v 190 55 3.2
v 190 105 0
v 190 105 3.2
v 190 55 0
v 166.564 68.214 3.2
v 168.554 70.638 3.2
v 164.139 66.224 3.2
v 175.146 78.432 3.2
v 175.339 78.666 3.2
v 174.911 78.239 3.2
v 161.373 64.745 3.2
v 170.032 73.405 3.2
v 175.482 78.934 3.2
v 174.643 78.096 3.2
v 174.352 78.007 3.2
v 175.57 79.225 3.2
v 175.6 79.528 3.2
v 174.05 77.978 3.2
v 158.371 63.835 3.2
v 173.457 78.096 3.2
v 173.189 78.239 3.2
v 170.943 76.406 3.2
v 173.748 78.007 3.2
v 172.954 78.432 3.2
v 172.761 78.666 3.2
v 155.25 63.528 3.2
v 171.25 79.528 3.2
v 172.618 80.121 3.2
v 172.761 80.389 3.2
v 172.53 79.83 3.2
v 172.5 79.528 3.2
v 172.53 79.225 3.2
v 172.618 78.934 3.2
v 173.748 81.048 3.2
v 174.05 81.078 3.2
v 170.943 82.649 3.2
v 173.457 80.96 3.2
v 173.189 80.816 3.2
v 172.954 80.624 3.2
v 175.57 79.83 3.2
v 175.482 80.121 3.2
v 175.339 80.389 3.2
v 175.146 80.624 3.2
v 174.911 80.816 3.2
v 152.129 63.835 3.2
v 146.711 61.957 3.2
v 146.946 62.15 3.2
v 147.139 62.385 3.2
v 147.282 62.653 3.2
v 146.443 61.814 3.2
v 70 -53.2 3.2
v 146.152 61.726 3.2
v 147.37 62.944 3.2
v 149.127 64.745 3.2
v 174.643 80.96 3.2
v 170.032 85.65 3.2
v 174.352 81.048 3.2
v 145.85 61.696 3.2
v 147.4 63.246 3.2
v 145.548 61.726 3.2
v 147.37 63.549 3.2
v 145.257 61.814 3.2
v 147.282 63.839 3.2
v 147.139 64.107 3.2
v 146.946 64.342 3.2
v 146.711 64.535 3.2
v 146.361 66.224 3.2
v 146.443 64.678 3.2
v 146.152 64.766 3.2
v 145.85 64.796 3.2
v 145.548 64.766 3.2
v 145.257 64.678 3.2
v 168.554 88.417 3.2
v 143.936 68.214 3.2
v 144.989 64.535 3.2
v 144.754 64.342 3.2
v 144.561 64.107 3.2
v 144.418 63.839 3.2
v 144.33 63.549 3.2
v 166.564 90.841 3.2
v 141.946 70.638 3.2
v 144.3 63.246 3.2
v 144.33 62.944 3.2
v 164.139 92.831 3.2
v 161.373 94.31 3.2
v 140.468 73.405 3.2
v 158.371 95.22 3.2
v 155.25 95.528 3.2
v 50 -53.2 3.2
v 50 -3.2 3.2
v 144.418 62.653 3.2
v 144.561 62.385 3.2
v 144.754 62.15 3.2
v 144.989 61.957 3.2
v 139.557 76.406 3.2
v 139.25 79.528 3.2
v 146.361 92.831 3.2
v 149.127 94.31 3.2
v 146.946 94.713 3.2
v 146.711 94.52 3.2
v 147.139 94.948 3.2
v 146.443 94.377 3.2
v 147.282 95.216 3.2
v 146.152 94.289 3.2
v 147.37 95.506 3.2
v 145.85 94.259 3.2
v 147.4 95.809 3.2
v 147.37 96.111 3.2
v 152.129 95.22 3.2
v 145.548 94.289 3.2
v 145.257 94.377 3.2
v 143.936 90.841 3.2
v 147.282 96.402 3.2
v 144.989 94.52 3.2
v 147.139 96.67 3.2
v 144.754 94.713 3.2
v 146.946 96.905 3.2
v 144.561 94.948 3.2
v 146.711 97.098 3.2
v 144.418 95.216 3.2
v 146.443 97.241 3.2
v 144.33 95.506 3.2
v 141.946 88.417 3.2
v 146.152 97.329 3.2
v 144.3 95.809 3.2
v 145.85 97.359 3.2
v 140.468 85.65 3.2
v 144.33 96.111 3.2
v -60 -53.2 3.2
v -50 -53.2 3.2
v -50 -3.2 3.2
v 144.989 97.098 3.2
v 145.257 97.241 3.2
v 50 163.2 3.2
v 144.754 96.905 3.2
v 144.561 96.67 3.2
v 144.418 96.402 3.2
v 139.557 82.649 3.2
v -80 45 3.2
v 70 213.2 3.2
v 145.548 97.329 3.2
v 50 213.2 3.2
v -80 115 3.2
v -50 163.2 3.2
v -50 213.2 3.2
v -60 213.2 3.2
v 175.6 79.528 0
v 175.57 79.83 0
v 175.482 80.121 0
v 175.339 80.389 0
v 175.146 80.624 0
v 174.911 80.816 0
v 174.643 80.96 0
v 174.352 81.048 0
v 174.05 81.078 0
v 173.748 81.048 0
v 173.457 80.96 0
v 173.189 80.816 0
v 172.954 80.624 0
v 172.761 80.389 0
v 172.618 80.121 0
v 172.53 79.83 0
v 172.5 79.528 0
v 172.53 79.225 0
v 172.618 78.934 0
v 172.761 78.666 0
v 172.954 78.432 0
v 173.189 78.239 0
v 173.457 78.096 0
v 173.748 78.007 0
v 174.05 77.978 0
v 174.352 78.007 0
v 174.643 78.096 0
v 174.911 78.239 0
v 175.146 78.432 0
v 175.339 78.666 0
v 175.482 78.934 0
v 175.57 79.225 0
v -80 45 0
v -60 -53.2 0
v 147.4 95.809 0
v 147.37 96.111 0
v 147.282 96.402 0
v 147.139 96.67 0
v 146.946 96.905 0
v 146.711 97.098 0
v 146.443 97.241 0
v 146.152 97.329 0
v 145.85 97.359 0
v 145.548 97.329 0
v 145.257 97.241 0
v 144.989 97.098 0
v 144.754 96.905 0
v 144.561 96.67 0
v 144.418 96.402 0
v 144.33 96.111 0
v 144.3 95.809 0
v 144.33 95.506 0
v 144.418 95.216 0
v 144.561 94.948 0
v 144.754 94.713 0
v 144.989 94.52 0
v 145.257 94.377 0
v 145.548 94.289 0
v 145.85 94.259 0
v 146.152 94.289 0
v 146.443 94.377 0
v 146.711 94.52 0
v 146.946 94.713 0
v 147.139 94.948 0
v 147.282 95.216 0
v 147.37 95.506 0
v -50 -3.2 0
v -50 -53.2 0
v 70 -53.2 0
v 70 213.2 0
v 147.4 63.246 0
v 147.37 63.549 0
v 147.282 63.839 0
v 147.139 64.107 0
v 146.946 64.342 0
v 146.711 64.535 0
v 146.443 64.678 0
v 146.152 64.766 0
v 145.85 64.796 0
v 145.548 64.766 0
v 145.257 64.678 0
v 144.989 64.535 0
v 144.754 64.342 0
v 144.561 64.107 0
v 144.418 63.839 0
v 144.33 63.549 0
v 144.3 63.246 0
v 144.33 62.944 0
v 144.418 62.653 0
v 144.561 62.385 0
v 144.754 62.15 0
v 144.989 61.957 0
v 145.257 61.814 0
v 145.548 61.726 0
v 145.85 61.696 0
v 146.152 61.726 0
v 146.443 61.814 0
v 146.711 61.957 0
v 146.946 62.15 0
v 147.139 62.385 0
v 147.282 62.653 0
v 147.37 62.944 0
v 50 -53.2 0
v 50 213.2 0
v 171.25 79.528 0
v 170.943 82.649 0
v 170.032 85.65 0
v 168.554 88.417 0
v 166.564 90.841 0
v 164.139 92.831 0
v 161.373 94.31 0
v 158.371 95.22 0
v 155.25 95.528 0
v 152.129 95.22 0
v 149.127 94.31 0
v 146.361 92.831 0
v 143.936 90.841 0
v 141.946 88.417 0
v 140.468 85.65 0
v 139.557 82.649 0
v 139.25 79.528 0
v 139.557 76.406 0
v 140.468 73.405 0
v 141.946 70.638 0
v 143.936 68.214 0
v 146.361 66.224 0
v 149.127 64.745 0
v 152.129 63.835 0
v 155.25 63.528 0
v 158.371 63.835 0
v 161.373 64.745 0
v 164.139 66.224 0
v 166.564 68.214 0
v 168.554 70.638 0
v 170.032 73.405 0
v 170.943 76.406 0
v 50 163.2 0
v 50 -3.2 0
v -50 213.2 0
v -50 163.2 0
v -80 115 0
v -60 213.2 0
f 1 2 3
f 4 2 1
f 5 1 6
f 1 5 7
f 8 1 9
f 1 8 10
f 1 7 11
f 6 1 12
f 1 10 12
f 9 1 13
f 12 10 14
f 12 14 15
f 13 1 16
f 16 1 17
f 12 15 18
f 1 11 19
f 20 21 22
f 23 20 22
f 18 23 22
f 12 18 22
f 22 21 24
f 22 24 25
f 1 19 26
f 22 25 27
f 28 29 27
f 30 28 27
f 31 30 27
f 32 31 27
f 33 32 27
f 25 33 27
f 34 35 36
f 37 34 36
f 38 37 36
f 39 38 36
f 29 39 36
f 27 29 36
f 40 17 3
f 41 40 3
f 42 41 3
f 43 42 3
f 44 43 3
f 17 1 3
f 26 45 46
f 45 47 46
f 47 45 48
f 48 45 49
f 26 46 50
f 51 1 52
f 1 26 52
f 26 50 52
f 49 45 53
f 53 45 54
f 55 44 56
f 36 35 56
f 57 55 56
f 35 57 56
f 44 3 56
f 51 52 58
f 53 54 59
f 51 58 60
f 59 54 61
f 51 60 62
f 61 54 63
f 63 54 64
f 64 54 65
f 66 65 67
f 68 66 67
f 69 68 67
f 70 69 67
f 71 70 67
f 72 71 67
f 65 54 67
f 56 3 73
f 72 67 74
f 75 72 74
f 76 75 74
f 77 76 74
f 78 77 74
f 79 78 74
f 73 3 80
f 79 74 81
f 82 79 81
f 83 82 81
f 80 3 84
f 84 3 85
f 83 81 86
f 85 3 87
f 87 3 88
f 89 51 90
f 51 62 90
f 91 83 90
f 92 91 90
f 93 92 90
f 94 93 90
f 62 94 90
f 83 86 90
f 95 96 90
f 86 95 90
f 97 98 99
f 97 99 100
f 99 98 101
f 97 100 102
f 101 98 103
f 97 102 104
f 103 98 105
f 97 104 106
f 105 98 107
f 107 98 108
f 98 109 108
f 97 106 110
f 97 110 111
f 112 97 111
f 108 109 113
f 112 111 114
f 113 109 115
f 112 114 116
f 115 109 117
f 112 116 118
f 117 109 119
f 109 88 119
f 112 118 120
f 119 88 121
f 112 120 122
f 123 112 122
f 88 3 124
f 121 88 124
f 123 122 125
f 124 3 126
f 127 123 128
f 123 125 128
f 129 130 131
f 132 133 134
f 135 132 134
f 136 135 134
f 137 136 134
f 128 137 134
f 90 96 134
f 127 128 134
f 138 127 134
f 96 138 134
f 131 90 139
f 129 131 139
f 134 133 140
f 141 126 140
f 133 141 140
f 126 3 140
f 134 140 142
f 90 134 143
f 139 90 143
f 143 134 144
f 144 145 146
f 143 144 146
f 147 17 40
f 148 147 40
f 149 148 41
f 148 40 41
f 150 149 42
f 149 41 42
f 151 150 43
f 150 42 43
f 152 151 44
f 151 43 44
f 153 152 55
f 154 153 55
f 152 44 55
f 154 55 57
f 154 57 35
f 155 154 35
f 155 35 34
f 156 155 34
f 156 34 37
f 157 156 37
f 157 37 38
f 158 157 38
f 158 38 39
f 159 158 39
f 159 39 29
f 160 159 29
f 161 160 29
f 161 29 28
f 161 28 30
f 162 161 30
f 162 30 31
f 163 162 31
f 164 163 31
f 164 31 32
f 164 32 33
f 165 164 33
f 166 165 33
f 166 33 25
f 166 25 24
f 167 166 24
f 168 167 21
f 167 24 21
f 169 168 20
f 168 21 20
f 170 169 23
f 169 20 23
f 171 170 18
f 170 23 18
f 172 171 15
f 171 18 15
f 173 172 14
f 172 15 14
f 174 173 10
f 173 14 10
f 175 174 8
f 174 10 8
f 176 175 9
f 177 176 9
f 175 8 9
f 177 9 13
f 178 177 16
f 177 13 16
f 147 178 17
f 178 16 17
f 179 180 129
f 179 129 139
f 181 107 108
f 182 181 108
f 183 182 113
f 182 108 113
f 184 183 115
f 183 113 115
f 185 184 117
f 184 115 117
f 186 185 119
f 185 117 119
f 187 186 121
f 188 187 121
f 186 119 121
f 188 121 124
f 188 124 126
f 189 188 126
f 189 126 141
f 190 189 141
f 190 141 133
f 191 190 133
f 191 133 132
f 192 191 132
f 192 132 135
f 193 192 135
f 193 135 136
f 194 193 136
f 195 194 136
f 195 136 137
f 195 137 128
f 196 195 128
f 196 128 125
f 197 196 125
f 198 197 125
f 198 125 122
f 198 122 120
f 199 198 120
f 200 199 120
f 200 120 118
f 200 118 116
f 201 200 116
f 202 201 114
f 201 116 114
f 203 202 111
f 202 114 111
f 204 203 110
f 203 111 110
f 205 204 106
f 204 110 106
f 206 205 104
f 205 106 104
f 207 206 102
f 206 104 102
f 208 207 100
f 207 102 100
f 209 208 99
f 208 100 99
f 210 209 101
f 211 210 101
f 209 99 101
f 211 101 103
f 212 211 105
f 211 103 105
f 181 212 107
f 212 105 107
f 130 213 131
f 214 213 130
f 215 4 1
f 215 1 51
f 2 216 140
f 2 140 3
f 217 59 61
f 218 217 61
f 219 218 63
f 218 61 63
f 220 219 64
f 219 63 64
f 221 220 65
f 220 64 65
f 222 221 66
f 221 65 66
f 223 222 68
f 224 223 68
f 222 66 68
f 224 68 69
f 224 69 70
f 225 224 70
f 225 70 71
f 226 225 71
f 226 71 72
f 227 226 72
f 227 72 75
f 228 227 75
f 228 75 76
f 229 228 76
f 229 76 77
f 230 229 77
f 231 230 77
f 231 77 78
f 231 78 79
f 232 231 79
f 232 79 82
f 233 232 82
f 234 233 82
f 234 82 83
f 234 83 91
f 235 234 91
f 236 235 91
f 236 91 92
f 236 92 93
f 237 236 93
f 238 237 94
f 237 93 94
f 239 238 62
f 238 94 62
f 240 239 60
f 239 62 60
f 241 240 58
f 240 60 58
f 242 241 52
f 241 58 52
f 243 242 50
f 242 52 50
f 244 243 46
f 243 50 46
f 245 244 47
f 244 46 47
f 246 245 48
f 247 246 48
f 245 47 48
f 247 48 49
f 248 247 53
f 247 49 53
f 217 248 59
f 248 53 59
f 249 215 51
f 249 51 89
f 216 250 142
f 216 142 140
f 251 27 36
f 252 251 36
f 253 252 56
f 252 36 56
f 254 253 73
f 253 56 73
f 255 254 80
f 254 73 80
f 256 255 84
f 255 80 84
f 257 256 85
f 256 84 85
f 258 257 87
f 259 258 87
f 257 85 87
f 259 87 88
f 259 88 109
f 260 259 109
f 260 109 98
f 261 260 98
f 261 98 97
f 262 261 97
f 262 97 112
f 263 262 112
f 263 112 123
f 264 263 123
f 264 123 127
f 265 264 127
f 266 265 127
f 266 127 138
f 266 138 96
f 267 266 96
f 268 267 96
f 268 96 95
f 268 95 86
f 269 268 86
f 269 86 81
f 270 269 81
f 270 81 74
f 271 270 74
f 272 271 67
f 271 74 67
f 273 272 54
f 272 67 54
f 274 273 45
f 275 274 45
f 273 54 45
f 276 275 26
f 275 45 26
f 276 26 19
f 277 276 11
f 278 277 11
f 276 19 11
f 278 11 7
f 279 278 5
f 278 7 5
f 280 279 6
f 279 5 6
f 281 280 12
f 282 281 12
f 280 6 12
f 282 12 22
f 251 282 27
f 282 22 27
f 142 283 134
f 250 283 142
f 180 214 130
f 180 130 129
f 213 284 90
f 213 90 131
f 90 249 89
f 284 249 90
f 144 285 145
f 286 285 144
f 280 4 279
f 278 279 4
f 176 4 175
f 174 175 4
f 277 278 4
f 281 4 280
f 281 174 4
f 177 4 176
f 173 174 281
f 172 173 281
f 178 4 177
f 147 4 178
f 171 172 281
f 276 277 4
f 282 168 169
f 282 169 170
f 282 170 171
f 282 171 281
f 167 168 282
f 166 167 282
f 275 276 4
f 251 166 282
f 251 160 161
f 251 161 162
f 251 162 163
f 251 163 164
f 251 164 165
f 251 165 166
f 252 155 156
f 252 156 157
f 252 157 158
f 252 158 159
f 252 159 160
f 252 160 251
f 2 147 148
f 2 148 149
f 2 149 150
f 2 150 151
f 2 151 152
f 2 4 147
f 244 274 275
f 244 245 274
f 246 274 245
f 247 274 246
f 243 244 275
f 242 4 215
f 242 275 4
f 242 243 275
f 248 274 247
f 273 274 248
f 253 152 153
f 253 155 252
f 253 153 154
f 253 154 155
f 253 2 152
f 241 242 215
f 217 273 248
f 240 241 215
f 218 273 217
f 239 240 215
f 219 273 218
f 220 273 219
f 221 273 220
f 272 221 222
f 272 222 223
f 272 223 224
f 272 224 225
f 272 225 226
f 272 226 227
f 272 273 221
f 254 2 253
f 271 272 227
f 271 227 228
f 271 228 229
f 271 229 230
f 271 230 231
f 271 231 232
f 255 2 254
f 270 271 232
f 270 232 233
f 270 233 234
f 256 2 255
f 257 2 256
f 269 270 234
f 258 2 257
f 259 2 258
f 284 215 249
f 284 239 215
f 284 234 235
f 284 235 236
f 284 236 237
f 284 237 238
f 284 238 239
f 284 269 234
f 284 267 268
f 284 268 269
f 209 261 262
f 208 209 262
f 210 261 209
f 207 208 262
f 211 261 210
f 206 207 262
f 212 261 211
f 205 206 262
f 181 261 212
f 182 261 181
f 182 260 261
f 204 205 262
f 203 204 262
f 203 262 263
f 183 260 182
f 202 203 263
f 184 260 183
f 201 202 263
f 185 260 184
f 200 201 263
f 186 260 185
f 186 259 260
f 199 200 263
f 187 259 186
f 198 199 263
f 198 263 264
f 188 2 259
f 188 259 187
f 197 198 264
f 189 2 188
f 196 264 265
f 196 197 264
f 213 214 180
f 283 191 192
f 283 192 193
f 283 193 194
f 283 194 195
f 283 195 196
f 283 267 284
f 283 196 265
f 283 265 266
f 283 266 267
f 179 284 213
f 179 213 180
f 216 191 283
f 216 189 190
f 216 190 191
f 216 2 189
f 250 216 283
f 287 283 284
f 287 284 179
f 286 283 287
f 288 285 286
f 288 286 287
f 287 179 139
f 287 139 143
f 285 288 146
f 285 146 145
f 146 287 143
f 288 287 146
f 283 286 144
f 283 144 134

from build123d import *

# Parameters (mm, degrees)
EXTRUDE_1_DEPTH         = 3.2
SKETCH_4_R              = 16
CUT_EXTRUDE_1_DEPTH     = 6
HOLE_WIZARD_3_1_3_1_4_D = 3.1


with BuildPart() as part:
    # Эскиз1 → Бобышка-Вытянуть1 (new body)
    with BuildSketch(Plane.XY):
        Polygon((50, -3.2), (-50, -3.2), (-50, -53.2), (-60, -53.2), (-80, 45), (-80, 115), (-60, 213.2), (-50, 213.2), (-50, 163.2), (50, 163.2), (50, 213.2), (70, 213.2), (190, 105), (190, 55), (70, -53.2), (50, -53.2), align=None)
    extrude(amount=EXTRUDE_1_DEPTH)

    # Эскиз4 → Вырез-Вытянуть1 (cut)
    with BuildSketch(Plane.XY.offset(3.2)):
        with Locations((155.25, 79.5275375)):
            Circle(SKETCH_4_R)
    extrude(amount=-CUT_EXTRUDE_1_DEPTH, mode=Mode.SUBTRACT)

    # Диаметр отверстия Ø3.1 (3.1)4 (through all)
    with Locations(Plane(origin=(0, 0, 0), x_dir=(-1, 0, 0), z_dir=(0, 0, -1))):
        with Locations((-145.85, 95.808815091), (-145.85, 63.246259909), (-174.05, 79.5275375)):
            Hole(HOLE_WIZARD_3_1_3_1_4_D / 2)


solid = part.part
